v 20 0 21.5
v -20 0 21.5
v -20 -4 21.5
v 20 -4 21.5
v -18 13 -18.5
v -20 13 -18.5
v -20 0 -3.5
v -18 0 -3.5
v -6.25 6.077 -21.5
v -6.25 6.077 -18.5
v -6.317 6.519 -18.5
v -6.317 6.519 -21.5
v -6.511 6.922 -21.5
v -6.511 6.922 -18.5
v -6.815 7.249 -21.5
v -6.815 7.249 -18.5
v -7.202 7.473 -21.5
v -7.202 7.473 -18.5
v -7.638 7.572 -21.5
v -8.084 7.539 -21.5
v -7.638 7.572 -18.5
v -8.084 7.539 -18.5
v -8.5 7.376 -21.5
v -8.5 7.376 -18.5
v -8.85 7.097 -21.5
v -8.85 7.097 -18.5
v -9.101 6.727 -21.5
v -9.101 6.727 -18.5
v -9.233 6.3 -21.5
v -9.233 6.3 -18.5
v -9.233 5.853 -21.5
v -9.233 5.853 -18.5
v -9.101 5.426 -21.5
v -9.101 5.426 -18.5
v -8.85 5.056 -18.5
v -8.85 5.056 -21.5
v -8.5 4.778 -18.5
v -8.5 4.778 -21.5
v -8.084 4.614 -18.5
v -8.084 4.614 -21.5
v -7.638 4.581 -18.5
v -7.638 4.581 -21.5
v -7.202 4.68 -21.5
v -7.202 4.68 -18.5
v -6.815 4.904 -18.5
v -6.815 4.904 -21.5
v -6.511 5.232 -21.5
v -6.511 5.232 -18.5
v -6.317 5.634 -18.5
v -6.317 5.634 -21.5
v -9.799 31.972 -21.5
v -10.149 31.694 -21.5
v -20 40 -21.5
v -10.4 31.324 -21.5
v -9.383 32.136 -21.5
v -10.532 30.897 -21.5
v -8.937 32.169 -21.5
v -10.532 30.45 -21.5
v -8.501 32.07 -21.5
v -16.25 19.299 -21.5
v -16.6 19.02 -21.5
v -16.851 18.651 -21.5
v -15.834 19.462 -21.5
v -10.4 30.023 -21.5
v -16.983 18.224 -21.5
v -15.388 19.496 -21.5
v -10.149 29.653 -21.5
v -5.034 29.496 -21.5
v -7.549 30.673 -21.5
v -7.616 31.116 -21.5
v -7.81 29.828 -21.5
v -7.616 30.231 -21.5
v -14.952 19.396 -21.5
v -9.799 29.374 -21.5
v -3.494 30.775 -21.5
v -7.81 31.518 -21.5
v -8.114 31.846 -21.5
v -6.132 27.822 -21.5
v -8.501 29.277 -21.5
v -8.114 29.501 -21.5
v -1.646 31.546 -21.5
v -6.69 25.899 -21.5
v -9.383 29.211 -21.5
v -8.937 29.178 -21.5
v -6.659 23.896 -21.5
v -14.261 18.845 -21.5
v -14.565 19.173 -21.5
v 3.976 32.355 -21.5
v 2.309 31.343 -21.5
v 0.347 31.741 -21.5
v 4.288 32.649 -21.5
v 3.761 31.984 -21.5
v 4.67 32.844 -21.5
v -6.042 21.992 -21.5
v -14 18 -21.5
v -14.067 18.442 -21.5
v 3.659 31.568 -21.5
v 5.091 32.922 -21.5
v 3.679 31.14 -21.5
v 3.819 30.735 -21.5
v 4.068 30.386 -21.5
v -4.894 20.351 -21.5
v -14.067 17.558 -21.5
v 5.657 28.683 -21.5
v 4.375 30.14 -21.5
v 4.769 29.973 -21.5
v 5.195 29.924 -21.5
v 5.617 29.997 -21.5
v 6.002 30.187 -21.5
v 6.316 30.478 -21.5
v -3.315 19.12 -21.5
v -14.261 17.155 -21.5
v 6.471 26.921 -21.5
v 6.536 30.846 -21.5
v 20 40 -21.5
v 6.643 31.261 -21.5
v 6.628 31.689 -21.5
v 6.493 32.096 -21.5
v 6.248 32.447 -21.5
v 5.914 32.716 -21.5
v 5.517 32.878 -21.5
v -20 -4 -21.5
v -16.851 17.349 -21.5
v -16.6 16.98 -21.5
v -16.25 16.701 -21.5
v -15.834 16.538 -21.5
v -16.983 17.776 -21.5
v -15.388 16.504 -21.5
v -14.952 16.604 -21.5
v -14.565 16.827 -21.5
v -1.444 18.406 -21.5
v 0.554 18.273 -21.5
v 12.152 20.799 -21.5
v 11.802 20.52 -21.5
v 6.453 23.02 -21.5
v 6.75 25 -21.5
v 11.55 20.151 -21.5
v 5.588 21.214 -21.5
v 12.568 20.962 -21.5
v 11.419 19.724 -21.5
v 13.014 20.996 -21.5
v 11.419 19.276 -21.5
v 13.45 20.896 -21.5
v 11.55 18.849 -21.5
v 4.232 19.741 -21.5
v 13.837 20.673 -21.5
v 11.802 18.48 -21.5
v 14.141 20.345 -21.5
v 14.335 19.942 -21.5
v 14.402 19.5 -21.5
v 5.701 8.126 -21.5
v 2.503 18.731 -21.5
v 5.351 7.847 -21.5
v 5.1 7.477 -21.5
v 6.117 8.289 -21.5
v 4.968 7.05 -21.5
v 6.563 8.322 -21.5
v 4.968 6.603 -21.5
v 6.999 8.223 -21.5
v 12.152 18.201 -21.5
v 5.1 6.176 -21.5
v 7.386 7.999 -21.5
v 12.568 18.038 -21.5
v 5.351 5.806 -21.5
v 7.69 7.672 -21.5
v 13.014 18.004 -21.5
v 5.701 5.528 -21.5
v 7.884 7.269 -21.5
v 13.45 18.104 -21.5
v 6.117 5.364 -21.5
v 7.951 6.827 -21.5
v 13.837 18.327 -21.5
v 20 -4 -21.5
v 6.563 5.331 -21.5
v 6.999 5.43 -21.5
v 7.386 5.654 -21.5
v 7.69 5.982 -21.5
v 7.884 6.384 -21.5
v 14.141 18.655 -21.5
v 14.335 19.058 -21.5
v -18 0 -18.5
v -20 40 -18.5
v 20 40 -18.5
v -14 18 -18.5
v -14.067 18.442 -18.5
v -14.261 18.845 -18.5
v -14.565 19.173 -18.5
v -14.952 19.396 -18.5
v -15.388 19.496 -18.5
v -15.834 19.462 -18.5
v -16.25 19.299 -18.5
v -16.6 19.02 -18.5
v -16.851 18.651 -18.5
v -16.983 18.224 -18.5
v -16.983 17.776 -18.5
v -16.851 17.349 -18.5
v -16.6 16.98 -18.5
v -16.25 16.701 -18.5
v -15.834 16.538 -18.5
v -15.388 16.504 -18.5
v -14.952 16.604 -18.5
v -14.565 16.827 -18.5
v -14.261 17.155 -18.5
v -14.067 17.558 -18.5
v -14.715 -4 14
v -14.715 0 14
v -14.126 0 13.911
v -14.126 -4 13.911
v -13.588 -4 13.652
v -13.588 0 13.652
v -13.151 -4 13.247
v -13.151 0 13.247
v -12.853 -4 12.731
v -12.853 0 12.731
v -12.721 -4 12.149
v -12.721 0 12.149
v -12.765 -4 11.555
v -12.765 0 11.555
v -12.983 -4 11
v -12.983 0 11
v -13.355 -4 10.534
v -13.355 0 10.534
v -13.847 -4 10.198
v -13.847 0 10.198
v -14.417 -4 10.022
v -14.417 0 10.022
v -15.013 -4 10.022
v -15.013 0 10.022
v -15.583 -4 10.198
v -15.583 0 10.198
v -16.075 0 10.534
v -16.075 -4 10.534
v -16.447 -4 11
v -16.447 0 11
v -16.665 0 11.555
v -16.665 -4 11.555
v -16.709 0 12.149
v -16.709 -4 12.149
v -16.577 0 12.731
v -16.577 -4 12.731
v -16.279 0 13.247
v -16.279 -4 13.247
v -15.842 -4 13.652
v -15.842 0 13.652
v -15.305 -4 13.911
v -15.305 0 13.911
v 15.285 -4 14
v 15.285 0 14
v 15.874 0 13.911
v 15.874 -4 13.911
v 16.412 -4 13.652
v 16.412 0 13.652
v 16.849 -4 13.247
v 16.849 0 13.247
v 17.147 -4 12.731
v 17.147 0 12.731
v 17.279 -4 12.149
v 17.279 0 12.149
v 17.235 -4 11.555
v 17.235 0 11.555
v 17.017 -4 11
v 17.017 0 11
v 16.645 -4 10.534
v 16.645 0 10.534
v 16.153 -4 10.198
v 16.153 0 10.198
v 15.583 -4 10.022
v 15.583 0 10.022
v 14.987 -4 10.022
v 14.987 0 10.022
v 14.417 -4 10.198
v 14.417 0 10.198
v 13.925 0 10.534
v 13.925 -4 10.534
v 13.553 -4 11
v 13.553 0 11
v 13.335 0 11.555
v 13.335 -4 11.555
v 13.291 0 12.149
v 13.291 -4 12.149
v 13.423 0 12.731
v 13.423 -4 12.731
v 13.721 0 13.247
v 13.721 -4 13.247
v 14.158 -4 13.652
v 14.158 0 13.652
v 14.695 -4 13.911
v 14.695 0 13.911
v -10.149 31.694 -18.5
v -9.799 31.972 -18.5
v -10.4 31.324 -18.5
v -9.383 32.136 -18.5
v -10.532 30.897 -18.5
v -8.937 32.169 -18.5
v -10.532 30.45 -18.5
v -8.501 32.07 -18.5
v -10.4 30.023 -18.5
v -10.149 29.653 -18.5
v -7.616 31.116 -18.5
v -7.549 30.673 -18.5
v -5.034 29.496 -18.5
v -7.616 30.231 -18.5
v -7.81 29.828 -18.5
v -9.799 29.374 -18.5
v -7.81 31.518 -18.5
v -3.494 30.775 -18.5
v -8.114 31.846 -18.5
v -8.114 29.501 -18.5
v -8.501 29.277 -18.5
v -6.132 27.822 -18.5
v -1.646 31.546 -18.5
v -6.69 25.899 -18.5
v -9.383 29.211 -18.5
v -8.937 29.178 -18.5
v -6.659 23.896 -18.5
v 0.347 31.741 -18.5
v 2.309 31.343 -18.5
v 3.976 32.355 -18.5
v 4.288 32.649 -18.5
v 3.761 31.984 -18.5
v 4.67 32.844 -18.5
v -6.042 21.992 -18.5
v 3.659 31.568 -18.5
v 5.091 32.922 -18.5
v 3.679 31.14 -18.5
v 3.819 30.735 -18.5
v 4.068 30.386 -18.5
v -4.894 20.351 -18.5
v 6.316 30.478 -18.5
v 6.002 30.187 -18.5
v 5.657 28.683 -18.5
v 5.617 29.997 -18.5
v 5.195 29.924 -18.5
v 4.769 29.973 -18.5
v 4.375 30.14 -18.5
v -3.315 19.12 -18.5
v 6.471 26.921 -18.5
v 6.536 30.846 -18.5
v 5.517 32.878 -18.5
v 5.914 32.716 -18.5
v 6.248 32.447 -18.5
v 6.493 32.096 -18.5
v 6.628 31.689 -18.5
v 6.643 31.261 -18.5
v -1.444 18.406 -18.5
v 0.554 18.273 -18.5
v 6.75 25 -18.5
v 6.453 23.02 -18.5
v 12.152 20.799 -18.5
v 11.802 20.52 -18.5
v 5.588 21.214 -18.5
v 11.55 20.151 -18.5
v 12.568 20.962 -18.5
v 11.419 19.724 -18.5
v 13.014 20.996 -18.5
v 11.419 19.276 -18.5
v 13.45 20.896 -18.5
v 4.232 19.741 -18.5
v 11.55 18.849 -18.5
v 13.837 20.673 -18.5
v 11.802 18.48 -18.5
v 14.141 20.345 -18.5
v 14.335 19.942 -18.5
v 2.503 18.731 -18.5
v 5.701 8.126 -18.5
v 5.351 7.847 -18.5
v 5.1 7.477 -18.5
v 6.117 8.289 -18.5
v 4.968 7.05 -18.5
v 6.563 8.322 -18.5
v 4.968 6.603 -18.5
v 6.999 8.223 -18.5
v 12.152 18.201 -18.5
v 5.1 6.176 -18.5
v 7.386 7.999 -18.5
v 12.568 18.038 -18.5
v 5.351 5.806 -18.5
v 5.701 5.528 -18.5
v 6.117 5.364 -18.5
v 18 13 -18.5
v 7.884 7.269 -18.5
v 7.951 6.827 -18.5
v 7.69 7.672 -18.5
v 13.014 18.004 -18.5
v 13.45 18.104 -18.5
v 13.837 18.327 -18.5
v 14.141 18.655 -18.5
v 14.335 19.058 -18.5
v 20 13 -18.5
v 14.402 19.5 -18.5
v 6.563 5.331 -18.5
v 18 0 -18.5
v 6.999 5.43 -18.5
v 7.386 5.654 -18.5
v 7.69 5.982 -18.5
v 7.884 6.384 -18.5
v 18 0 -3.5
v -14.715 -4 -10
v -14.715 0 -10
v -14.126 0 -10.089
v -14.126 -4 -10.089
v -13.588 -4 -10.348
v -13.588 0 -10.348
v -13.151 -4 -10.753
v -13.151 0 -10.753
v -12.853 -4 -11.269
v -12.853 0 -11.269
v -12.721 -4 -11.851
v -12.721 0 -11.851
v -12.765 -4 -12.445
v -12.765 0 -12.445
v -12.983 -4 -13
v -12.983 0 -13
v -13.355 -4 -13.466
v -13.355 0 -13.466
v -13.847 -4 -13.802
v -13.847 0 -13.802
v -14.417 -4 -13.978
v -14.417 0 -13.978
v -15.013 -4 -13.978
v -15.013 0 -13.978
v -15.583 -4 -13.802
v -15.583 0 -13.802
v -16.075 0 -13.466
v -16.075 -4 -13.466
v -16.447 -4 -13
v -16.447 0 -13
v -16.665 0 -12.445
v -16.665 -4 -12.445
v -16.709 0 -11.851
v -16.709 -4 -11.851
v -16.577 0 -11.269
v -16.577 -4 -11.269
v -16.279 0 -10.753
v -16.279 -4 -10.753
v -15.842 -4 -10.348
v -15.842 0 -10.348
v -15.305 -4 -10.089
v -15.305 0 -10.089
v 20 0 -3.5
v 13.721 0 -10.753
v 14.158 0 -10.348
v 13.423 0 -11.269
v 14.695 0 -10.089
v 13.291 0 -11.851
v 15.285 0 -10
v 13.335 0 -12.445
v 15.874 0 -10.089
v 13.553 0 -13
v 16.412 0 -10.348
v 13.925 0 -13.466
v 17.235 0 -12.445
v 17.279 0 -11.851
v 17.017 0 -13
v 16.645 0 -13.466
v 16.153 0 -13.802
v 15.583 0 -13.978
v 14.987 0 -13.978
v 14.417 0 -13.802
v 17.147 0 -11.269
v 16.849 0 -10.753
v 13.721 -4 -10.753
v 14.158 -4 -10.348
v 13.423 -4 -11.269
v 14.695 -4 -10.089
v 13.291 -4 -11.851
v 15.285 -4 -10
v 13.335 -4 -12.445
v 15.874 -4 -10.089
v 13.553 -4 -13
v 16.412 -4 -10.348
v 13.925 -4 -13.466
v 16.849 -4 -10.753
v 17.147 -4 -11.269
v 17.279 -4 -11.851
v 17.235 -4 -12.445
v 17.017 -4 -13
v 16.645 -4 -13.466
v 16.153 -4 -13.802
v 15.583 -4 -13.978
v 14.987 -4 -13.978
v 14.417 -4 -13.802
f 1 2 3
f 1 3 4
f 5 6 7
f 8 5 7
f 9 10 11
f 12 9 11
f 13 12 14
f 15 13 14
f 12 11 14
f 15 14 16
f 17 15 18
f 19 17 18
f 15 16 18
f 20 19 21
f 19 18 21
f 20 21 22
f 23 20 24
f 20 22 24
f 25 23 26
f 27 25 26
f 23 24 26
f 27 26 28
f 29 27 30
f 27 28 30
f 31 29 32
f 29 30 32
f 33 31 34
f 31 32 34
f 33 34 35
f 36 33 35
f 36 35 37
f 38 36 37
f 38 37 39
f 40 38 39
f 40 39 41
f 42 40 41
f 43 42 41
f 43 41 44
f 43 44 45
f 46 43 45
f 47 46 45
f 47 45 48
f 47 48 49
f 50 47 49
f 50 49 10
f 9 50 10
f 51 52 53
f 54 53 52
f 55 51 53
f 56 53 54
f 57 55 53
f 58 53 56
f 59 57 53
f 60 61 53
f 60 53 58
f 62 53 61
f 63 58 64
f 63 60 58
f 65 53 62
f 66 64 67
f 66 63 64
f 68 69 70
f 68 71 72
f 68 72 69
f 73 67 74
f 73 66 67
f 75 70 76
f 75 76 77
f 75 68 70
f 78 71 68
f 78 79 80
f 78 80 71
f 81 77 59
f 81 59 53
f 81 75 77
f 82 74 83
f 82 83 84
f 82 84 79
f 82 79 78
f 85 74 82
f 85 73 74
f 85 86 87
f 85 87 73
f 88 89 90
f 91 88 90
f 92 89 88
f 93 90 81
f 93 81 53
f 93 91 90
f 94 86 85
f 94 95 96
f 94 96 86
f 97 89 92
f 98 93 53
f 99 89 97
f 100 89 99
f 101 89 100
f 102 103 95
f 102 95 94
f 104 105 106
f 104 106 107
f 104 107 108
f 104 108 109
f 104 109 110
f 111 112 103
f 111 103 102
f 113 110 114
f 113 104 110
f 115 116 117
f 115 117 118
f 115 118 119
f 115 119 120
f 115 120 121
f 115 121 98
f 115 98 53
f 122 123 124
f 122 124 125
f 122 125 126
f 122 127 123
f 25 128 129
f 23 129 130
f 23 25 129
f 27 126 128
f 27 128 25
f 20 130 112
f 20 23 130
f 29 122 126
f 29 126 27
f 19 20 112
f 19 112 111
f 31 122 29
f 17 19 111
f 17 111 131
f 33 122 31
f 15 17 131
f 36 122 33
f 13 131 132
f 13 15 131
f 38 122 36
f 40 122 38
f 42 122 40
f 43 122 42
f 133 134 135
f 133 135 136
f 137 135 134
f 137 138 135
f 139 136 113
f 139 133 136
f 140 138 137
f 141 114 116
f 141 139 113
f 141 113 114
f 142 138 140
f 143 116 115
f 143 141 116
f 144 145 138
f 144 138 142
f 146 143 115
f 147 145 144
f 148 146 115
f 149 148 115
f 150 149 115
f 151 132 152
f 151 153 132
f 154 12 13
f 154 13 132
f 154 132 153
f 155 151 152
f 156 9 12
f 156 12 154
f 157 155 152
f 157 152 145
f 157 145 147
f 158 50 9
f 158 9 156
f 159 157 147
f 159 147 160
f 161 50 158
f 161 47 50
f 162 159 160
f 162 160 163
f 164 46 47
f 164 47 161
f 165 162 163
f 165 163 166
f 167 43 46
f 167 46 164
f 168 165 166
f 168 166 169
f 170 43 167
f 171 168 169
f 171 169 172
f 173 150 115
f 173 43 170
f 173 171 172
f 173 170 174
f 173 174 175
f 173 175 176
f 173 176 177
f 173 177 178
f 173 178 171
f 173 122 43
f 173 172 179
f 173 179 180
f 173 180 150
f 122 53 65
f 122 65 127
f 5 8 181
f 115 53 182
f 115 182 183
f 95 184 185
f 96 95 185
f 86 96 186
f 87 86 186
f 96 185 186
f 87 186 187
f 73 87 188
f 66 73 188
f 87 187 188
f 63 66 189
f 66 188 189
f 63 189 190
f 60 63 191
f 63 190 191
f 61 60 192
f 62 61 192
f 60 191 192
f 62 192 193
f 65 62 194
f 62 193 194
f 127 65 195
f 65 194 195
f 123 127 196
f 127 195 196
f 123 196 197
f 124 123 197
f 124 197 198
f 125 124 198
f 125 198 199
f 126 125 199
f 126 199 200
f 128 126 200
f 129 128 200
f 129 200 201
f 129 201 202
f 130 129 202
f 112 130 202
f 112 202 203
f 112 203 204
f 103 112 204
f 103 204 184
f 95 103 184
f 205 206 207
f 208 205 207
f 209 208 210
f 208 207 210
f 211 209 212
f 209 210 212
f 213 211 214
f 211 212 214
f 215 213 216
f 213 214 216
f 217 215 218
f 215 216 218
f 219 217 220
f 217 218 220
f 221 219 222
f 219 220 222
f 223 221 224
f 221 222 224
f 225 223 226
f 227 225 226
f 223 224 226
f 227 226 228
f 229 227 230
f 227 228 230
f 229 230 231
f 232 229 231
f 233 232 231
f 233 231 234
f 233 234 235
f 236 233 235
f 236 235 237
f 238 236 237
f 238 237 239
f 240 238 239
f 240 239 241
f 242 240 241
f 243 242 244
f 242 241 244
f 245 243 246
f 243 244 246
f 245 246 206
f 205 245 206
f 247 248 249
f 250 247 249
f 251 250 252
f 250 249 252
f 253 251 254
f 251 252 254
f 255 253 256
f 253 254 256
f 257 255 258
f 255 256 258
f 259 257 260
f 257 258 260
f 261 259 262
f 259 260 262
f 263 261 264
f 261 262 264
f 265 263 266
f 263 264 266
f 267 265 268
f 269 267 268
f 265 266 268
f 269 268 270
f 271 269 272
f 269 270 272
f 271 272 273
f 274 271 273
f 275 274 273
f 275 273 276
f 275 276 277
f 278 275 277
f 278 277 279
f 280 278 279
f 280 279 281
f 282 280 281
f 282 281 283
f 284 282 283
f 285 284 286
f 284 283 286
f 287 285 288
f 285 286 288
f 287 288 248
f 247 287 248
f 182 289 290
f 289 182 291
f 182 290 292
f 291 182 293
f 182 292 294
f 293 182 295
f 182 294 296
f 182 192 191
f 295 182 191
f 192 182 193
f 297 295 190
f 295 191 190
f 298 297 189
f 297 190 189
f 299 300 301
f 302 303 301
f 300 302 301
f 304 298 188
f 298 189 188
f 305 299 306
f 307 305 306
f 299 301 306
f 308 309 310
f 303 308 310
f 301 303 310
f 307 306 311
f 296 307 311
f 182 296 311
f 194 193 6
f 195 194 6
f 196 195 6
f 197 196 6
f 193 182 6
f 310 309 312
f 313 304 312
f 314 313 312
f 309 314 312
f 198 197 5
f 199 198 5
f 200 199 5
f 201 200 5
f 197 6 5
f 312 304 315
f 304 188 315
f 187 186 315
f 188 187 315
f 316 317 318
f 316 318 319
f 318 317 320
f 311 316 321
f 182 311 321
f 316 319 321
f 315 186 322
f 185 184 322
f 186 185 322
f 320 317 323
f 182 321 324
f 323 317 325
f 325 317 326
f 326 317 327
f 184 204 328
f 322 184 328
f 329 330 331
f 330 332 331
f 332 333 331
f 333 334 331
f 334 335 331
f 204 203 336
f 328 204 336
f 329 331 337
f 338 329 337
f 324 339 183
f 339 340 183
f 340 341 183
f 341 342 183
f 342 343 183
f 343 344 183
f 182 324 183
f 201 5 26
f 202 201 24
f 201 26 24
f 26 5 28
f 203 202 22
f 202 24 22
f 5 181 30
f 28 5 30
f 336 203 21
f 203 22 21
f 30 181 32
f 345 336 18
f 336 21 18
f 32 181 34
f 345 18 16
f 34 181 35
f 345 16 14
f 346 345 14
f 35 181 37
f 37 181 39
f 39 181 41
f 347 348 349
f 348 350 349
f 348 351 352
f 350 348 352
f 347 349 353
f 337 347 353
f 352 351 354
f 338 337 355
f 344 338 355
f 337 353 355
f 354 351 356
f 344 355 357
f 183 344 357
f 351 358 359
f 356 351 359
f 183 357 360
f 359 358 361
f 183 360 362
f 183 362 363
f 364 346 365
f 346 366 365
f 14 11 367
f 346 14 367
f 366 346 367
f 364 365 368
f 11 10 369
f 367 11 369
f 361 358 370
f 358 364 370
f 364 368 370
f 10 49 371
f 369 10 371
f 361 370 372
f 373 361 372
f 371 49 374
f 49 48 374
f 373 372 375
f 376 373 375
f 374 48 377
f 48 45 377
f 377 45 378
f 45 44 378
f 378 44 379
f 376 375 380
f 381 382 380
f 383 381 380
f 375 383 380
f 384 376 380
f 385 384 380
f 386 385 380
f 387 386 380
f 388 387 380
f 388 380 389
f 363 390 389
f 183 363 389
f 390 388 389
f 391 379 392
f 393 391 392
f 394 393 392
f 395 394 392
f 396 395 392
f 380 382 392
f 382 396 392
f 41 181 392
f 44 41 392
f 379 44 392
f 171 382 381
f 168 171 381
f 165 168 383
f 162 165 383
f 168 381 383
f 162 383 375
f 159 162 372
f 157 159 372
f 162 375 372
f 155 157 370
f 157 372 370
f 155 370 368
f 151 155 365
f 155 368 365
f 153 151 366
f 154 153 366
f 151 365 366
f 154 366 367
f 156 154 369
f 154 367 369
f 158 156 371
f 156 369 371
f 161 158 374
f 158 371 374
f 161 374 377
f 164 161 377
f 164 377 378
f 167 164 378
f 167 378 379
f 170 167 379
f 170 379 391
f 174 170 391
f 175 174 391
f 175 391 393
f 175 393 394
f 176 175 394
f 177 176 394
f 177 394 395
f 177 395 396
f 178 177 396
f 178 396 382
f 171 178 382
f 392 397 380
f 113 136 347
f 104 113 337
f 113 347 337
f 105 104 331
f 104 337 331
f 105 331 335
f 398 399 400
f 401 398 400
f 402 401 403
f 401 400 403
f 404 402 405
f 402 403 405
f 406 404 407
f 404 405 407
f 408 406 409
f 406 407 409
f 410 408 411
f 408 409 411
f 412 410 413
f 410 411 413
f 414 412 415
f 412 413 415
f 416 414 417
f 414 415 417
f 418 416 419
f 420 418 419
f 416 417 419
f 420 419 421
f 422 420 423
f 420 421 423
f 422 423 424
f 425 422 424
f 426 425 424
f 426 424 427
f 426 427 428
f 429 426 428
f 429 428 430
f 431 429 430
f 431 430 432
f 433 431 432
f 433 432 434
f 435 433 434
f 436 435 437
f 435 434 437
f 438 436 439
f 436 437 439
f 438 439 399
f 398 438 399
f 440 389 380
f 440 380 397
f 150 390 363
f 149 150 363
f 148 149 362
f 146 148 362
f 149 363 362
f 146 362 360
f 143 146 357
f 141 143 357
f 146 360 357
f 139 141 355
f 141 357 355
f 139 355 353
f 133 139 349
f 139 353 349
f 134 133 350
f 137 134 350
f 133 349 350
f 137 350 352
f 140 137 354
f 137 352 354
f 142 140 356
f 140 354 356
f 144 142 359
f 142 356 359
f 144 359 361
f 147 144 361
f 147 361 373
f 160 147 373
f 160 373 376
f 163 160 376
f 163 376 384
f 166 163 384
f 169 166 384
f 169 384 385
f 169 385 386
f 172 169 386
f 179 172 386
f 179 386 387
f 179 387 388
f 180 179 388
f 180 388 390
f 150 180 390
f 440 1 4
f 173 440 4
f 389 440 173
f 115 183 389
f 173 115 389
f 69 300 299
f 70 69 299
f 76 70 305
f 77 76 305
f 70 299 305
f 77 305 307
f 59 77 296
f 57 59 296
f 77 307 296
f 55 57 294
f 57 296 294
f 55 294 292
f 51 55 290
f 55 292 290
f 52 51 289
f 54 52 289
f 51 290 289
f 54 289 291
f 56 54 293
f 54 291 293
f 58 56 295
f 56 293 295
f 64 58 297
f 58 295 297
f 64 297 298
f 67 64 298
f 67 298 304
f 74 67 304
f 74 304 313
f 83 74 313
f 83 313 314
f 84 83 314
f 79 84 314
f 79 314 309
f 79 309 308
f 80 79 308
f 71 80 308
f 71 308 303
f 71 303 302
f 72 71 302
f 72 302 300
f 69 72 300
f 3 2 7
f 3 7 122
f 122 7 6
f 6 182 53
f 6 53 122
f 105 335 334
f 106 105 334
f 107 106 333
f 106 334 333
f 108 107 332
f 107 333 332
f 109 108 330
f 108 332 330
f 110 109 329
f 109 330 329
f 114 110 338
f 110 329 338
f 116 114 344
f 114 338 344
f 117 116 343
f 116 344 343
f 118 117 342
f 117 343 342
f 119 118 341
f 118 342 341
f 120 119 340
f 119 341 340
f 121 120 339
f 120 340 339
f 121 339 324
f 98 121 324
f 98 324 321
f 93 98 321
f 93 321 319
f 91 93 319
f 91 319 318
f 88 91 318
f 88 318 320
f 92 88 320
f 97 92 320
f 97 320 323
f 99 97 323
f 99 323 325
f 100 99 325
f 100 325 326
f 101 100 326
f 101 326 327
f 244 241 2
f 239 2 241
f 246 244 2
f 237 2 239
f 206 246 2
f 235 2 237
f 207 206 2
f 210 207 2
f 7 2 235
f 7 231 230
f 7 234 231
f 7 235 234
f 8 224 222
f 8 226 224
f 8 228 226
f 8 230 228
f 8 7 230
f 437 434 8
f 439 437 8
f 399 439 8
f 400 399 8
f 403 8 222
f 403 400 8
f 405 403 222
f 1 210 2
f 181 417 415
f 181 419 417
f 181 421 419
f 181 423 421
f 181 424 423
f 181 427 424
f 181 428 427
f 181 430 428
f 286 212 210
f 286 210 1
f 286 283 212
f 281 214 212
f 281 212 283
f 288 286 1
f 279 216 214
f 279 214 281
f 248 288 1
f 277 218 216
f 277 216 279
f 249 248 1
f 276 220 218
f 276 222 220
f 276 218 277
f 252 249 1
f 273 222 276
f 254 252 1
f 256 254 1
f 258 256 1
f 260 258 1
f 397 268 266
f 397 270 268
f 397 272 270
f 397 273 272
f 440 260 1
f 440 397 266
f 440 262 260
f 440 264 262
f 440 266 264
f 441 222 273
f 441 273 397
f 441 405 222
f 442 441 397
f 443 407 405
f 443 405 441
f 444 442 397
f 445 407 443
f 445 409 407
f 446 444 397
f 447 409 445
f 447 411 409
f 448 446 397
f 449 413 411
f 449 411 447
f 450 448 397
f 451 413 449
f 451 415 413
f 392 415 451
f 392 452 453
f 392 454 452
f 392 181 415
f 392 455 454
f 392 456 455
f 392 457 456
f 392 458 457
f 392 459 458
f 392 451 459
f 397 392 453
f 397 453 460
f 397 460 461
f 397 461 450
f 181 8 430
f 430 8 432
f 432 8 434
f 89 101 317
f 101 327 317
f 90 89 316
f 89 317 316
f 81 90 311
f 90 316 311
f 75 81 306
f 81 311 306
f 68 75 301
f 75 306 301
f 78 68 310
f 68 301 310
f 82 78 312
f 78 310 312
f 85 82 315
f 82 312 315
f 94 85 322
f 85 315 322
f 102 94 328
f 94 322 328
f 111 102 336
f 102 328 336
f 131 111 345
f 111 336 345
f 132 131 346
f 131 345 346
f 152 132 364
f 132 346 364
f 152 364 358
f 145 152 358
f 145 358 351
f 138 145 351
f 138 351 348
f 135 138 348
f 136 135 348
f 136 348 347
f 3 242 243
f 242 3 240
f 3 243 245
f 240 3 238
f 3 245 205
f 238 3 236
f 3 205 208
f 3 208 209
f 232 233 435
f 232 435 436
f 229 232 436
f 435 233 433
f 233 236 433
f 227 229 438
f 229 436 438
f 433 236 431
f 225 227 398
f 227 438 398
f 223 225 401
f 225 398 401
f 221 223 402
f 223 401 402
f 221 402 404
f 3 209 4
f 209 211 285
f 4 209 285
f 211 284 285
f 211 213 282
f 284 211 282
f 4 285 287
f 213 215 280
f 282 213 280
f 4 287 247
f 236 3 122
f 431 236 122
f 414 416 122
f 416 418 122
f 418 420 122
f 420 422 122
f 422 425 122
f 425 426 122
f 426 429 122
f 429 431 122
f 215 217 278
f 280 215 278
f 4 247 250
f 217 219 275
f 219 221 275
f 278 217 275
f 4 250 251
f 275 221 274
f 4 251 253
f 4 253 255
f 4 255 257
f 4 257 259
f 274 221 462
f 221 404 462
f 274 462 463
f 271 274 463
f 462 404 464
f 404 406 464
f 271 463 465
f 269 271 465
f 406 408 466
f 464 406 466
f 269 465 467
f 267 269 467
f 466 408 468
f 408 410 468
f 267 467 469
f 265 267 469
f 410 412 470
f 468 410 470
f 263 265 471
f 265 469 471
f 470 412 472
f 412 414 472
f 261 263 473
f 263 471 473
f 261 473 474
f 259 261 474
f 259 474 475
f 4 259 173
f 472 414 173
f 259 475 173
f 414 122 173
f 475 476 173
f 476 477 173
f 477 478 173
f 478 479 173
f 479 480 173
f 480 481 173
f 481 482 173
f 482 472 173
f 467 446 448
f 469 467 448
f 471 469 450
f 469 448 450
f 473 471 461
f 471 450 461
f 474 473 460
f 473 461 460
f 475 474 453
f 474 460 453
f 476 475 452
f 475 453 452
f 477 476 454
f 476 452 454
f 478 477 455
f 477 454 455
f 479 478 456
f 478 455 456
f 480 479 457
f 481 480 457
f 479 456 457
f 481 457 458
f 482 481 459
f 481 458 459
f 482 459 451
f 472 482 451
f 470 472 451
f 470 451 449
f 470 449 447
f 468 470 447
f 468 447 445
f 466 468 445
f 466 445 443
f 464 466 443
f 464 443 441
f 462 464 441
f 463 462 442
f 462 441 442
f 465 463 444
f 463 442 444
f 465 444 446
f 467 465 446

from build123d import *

# Parameters (mm, degrees)
SKETCH1_W           = 40
SKETCH1_H           = 43
SKETCH1_R           = 2
BOSS_EXTRUDE1_DEPTH = 4
SKETCH4_W           = 40
SKETCH4_H           = 3
BOSS_EXTRUDE2_DEPTH = 40
SKETCH5_R           = 6.75
CUT_EXTRUDE5_DEPTH  = 34
SKETCH8_R           = 1.5
CUT_EXTRUDE6_DEPTH  = 10
BOSS_EXTRUDE3_DEPTH = 2
BOSS_EXTRUDE4_DEPTH = 2


with BuildPart() as part:
    # Sketch1 → Boss-Extrude1 (new body)
    with BuildSketch(Plane(origin=(0, 0, 0), x_dir=(1, 0, 0), z_dir=(0, 1, 0))):
        Rectangle(SKETCH1_W, SKETCH1_H)
        with Locations(Location((-14.715053003, 12, 0), (0, 0, 270))):
            Circle(SKETCH1_R, mode=Mode.SUBTRACT)
        with Locations(Location((15.284946997, 12, 0), (0, 0, 270))):
            Circle(SKETCH1_R, mode=Mode.SUBTRACT)
        with Locations(Location((-14.715053003, -12, 0), (0, 0, 270))):
            Circle(SKETCH1_R, mode=Mode.SUBTRACT)
        with Locations(Location((15.284946997, -12, 0), (0, 0, 270))):
            Circle(SKETCH1_R, mode=Mode.SUBTRACT)
    extrude(amount=-BOSS_EXTRUDE1_DEPTH)

    # Sketch4 → Boss-Extrude2 (add)
    with BuildSketch(Plane(origin=(0, 0, 0), x_dir=(1, 0, 0), z_dir=(0, 1, 0))):
        with Locations((0, 20)):
            Rectangle(SKETCH4_W, SKETCH4_H)
    extrude(amount=BOSS_EXTRUDE2_DEPTH)

    # Sketch5 → Cut-Extrude5 (cut)
    with BuildSketch(Plane.XY.offset(-18.5)):
        with Locations((0, 25)):
            Circle(SKETCH5_R)
    extrude(amount=-CUT_EXTRUDE5_DEPTH, mode=Mode.SUBTRACT)

    # Sketch8 → Cut-Extrude6 (cut)
    with BuildSketch(Plane.XY.offset(-18.5)):
        with Locations((-15.5, 18)):
            Circle(SKETCH8_R)
        with Locations((-9.049038106, 30.673393759)):
            Circle(SKETCH8_R)
        with Locations((5.151923789, 31.423393759)):
            Circle(SKETCH8_R)
        with Locations((12.901923789, 19.5)):
            Circle(SKETCH8_R)
        with Locations((6.450961894, 6.826606241)):
            Circle(SKETCH8_R)
        with Locations((-7.75, 6.076606241)):
            Circle(SKETCH8_R)
    extrude(amount=-CUT_EXTRUDE6_DEPTH, mode=Mode.SUBTRACT)

    # Sketch9 → Boss-Extrude3 (add)
    with BuildSketch(Plane(origin=(20, 0, 0), x_dir=(0, 0, -1), z_dir=(1, 0, 0))):
        Polygon((18.5, 13), (3.5, 0), (18.5, 0), align=None)
    extrude(amount=-BOSS_EXTRUDE3_DEPTH)

    # Sketch10 → Boss-Extrude4 (add)
    with BuildSketch(Plane.ZY.offset(20)):
        Polygon((-18.5, 13), (-3.5, 0), (-18.5, 0), align=None)
    extrude(amount=-BOSS_EXTRUDE4_DEPTH)


solid = part.part
